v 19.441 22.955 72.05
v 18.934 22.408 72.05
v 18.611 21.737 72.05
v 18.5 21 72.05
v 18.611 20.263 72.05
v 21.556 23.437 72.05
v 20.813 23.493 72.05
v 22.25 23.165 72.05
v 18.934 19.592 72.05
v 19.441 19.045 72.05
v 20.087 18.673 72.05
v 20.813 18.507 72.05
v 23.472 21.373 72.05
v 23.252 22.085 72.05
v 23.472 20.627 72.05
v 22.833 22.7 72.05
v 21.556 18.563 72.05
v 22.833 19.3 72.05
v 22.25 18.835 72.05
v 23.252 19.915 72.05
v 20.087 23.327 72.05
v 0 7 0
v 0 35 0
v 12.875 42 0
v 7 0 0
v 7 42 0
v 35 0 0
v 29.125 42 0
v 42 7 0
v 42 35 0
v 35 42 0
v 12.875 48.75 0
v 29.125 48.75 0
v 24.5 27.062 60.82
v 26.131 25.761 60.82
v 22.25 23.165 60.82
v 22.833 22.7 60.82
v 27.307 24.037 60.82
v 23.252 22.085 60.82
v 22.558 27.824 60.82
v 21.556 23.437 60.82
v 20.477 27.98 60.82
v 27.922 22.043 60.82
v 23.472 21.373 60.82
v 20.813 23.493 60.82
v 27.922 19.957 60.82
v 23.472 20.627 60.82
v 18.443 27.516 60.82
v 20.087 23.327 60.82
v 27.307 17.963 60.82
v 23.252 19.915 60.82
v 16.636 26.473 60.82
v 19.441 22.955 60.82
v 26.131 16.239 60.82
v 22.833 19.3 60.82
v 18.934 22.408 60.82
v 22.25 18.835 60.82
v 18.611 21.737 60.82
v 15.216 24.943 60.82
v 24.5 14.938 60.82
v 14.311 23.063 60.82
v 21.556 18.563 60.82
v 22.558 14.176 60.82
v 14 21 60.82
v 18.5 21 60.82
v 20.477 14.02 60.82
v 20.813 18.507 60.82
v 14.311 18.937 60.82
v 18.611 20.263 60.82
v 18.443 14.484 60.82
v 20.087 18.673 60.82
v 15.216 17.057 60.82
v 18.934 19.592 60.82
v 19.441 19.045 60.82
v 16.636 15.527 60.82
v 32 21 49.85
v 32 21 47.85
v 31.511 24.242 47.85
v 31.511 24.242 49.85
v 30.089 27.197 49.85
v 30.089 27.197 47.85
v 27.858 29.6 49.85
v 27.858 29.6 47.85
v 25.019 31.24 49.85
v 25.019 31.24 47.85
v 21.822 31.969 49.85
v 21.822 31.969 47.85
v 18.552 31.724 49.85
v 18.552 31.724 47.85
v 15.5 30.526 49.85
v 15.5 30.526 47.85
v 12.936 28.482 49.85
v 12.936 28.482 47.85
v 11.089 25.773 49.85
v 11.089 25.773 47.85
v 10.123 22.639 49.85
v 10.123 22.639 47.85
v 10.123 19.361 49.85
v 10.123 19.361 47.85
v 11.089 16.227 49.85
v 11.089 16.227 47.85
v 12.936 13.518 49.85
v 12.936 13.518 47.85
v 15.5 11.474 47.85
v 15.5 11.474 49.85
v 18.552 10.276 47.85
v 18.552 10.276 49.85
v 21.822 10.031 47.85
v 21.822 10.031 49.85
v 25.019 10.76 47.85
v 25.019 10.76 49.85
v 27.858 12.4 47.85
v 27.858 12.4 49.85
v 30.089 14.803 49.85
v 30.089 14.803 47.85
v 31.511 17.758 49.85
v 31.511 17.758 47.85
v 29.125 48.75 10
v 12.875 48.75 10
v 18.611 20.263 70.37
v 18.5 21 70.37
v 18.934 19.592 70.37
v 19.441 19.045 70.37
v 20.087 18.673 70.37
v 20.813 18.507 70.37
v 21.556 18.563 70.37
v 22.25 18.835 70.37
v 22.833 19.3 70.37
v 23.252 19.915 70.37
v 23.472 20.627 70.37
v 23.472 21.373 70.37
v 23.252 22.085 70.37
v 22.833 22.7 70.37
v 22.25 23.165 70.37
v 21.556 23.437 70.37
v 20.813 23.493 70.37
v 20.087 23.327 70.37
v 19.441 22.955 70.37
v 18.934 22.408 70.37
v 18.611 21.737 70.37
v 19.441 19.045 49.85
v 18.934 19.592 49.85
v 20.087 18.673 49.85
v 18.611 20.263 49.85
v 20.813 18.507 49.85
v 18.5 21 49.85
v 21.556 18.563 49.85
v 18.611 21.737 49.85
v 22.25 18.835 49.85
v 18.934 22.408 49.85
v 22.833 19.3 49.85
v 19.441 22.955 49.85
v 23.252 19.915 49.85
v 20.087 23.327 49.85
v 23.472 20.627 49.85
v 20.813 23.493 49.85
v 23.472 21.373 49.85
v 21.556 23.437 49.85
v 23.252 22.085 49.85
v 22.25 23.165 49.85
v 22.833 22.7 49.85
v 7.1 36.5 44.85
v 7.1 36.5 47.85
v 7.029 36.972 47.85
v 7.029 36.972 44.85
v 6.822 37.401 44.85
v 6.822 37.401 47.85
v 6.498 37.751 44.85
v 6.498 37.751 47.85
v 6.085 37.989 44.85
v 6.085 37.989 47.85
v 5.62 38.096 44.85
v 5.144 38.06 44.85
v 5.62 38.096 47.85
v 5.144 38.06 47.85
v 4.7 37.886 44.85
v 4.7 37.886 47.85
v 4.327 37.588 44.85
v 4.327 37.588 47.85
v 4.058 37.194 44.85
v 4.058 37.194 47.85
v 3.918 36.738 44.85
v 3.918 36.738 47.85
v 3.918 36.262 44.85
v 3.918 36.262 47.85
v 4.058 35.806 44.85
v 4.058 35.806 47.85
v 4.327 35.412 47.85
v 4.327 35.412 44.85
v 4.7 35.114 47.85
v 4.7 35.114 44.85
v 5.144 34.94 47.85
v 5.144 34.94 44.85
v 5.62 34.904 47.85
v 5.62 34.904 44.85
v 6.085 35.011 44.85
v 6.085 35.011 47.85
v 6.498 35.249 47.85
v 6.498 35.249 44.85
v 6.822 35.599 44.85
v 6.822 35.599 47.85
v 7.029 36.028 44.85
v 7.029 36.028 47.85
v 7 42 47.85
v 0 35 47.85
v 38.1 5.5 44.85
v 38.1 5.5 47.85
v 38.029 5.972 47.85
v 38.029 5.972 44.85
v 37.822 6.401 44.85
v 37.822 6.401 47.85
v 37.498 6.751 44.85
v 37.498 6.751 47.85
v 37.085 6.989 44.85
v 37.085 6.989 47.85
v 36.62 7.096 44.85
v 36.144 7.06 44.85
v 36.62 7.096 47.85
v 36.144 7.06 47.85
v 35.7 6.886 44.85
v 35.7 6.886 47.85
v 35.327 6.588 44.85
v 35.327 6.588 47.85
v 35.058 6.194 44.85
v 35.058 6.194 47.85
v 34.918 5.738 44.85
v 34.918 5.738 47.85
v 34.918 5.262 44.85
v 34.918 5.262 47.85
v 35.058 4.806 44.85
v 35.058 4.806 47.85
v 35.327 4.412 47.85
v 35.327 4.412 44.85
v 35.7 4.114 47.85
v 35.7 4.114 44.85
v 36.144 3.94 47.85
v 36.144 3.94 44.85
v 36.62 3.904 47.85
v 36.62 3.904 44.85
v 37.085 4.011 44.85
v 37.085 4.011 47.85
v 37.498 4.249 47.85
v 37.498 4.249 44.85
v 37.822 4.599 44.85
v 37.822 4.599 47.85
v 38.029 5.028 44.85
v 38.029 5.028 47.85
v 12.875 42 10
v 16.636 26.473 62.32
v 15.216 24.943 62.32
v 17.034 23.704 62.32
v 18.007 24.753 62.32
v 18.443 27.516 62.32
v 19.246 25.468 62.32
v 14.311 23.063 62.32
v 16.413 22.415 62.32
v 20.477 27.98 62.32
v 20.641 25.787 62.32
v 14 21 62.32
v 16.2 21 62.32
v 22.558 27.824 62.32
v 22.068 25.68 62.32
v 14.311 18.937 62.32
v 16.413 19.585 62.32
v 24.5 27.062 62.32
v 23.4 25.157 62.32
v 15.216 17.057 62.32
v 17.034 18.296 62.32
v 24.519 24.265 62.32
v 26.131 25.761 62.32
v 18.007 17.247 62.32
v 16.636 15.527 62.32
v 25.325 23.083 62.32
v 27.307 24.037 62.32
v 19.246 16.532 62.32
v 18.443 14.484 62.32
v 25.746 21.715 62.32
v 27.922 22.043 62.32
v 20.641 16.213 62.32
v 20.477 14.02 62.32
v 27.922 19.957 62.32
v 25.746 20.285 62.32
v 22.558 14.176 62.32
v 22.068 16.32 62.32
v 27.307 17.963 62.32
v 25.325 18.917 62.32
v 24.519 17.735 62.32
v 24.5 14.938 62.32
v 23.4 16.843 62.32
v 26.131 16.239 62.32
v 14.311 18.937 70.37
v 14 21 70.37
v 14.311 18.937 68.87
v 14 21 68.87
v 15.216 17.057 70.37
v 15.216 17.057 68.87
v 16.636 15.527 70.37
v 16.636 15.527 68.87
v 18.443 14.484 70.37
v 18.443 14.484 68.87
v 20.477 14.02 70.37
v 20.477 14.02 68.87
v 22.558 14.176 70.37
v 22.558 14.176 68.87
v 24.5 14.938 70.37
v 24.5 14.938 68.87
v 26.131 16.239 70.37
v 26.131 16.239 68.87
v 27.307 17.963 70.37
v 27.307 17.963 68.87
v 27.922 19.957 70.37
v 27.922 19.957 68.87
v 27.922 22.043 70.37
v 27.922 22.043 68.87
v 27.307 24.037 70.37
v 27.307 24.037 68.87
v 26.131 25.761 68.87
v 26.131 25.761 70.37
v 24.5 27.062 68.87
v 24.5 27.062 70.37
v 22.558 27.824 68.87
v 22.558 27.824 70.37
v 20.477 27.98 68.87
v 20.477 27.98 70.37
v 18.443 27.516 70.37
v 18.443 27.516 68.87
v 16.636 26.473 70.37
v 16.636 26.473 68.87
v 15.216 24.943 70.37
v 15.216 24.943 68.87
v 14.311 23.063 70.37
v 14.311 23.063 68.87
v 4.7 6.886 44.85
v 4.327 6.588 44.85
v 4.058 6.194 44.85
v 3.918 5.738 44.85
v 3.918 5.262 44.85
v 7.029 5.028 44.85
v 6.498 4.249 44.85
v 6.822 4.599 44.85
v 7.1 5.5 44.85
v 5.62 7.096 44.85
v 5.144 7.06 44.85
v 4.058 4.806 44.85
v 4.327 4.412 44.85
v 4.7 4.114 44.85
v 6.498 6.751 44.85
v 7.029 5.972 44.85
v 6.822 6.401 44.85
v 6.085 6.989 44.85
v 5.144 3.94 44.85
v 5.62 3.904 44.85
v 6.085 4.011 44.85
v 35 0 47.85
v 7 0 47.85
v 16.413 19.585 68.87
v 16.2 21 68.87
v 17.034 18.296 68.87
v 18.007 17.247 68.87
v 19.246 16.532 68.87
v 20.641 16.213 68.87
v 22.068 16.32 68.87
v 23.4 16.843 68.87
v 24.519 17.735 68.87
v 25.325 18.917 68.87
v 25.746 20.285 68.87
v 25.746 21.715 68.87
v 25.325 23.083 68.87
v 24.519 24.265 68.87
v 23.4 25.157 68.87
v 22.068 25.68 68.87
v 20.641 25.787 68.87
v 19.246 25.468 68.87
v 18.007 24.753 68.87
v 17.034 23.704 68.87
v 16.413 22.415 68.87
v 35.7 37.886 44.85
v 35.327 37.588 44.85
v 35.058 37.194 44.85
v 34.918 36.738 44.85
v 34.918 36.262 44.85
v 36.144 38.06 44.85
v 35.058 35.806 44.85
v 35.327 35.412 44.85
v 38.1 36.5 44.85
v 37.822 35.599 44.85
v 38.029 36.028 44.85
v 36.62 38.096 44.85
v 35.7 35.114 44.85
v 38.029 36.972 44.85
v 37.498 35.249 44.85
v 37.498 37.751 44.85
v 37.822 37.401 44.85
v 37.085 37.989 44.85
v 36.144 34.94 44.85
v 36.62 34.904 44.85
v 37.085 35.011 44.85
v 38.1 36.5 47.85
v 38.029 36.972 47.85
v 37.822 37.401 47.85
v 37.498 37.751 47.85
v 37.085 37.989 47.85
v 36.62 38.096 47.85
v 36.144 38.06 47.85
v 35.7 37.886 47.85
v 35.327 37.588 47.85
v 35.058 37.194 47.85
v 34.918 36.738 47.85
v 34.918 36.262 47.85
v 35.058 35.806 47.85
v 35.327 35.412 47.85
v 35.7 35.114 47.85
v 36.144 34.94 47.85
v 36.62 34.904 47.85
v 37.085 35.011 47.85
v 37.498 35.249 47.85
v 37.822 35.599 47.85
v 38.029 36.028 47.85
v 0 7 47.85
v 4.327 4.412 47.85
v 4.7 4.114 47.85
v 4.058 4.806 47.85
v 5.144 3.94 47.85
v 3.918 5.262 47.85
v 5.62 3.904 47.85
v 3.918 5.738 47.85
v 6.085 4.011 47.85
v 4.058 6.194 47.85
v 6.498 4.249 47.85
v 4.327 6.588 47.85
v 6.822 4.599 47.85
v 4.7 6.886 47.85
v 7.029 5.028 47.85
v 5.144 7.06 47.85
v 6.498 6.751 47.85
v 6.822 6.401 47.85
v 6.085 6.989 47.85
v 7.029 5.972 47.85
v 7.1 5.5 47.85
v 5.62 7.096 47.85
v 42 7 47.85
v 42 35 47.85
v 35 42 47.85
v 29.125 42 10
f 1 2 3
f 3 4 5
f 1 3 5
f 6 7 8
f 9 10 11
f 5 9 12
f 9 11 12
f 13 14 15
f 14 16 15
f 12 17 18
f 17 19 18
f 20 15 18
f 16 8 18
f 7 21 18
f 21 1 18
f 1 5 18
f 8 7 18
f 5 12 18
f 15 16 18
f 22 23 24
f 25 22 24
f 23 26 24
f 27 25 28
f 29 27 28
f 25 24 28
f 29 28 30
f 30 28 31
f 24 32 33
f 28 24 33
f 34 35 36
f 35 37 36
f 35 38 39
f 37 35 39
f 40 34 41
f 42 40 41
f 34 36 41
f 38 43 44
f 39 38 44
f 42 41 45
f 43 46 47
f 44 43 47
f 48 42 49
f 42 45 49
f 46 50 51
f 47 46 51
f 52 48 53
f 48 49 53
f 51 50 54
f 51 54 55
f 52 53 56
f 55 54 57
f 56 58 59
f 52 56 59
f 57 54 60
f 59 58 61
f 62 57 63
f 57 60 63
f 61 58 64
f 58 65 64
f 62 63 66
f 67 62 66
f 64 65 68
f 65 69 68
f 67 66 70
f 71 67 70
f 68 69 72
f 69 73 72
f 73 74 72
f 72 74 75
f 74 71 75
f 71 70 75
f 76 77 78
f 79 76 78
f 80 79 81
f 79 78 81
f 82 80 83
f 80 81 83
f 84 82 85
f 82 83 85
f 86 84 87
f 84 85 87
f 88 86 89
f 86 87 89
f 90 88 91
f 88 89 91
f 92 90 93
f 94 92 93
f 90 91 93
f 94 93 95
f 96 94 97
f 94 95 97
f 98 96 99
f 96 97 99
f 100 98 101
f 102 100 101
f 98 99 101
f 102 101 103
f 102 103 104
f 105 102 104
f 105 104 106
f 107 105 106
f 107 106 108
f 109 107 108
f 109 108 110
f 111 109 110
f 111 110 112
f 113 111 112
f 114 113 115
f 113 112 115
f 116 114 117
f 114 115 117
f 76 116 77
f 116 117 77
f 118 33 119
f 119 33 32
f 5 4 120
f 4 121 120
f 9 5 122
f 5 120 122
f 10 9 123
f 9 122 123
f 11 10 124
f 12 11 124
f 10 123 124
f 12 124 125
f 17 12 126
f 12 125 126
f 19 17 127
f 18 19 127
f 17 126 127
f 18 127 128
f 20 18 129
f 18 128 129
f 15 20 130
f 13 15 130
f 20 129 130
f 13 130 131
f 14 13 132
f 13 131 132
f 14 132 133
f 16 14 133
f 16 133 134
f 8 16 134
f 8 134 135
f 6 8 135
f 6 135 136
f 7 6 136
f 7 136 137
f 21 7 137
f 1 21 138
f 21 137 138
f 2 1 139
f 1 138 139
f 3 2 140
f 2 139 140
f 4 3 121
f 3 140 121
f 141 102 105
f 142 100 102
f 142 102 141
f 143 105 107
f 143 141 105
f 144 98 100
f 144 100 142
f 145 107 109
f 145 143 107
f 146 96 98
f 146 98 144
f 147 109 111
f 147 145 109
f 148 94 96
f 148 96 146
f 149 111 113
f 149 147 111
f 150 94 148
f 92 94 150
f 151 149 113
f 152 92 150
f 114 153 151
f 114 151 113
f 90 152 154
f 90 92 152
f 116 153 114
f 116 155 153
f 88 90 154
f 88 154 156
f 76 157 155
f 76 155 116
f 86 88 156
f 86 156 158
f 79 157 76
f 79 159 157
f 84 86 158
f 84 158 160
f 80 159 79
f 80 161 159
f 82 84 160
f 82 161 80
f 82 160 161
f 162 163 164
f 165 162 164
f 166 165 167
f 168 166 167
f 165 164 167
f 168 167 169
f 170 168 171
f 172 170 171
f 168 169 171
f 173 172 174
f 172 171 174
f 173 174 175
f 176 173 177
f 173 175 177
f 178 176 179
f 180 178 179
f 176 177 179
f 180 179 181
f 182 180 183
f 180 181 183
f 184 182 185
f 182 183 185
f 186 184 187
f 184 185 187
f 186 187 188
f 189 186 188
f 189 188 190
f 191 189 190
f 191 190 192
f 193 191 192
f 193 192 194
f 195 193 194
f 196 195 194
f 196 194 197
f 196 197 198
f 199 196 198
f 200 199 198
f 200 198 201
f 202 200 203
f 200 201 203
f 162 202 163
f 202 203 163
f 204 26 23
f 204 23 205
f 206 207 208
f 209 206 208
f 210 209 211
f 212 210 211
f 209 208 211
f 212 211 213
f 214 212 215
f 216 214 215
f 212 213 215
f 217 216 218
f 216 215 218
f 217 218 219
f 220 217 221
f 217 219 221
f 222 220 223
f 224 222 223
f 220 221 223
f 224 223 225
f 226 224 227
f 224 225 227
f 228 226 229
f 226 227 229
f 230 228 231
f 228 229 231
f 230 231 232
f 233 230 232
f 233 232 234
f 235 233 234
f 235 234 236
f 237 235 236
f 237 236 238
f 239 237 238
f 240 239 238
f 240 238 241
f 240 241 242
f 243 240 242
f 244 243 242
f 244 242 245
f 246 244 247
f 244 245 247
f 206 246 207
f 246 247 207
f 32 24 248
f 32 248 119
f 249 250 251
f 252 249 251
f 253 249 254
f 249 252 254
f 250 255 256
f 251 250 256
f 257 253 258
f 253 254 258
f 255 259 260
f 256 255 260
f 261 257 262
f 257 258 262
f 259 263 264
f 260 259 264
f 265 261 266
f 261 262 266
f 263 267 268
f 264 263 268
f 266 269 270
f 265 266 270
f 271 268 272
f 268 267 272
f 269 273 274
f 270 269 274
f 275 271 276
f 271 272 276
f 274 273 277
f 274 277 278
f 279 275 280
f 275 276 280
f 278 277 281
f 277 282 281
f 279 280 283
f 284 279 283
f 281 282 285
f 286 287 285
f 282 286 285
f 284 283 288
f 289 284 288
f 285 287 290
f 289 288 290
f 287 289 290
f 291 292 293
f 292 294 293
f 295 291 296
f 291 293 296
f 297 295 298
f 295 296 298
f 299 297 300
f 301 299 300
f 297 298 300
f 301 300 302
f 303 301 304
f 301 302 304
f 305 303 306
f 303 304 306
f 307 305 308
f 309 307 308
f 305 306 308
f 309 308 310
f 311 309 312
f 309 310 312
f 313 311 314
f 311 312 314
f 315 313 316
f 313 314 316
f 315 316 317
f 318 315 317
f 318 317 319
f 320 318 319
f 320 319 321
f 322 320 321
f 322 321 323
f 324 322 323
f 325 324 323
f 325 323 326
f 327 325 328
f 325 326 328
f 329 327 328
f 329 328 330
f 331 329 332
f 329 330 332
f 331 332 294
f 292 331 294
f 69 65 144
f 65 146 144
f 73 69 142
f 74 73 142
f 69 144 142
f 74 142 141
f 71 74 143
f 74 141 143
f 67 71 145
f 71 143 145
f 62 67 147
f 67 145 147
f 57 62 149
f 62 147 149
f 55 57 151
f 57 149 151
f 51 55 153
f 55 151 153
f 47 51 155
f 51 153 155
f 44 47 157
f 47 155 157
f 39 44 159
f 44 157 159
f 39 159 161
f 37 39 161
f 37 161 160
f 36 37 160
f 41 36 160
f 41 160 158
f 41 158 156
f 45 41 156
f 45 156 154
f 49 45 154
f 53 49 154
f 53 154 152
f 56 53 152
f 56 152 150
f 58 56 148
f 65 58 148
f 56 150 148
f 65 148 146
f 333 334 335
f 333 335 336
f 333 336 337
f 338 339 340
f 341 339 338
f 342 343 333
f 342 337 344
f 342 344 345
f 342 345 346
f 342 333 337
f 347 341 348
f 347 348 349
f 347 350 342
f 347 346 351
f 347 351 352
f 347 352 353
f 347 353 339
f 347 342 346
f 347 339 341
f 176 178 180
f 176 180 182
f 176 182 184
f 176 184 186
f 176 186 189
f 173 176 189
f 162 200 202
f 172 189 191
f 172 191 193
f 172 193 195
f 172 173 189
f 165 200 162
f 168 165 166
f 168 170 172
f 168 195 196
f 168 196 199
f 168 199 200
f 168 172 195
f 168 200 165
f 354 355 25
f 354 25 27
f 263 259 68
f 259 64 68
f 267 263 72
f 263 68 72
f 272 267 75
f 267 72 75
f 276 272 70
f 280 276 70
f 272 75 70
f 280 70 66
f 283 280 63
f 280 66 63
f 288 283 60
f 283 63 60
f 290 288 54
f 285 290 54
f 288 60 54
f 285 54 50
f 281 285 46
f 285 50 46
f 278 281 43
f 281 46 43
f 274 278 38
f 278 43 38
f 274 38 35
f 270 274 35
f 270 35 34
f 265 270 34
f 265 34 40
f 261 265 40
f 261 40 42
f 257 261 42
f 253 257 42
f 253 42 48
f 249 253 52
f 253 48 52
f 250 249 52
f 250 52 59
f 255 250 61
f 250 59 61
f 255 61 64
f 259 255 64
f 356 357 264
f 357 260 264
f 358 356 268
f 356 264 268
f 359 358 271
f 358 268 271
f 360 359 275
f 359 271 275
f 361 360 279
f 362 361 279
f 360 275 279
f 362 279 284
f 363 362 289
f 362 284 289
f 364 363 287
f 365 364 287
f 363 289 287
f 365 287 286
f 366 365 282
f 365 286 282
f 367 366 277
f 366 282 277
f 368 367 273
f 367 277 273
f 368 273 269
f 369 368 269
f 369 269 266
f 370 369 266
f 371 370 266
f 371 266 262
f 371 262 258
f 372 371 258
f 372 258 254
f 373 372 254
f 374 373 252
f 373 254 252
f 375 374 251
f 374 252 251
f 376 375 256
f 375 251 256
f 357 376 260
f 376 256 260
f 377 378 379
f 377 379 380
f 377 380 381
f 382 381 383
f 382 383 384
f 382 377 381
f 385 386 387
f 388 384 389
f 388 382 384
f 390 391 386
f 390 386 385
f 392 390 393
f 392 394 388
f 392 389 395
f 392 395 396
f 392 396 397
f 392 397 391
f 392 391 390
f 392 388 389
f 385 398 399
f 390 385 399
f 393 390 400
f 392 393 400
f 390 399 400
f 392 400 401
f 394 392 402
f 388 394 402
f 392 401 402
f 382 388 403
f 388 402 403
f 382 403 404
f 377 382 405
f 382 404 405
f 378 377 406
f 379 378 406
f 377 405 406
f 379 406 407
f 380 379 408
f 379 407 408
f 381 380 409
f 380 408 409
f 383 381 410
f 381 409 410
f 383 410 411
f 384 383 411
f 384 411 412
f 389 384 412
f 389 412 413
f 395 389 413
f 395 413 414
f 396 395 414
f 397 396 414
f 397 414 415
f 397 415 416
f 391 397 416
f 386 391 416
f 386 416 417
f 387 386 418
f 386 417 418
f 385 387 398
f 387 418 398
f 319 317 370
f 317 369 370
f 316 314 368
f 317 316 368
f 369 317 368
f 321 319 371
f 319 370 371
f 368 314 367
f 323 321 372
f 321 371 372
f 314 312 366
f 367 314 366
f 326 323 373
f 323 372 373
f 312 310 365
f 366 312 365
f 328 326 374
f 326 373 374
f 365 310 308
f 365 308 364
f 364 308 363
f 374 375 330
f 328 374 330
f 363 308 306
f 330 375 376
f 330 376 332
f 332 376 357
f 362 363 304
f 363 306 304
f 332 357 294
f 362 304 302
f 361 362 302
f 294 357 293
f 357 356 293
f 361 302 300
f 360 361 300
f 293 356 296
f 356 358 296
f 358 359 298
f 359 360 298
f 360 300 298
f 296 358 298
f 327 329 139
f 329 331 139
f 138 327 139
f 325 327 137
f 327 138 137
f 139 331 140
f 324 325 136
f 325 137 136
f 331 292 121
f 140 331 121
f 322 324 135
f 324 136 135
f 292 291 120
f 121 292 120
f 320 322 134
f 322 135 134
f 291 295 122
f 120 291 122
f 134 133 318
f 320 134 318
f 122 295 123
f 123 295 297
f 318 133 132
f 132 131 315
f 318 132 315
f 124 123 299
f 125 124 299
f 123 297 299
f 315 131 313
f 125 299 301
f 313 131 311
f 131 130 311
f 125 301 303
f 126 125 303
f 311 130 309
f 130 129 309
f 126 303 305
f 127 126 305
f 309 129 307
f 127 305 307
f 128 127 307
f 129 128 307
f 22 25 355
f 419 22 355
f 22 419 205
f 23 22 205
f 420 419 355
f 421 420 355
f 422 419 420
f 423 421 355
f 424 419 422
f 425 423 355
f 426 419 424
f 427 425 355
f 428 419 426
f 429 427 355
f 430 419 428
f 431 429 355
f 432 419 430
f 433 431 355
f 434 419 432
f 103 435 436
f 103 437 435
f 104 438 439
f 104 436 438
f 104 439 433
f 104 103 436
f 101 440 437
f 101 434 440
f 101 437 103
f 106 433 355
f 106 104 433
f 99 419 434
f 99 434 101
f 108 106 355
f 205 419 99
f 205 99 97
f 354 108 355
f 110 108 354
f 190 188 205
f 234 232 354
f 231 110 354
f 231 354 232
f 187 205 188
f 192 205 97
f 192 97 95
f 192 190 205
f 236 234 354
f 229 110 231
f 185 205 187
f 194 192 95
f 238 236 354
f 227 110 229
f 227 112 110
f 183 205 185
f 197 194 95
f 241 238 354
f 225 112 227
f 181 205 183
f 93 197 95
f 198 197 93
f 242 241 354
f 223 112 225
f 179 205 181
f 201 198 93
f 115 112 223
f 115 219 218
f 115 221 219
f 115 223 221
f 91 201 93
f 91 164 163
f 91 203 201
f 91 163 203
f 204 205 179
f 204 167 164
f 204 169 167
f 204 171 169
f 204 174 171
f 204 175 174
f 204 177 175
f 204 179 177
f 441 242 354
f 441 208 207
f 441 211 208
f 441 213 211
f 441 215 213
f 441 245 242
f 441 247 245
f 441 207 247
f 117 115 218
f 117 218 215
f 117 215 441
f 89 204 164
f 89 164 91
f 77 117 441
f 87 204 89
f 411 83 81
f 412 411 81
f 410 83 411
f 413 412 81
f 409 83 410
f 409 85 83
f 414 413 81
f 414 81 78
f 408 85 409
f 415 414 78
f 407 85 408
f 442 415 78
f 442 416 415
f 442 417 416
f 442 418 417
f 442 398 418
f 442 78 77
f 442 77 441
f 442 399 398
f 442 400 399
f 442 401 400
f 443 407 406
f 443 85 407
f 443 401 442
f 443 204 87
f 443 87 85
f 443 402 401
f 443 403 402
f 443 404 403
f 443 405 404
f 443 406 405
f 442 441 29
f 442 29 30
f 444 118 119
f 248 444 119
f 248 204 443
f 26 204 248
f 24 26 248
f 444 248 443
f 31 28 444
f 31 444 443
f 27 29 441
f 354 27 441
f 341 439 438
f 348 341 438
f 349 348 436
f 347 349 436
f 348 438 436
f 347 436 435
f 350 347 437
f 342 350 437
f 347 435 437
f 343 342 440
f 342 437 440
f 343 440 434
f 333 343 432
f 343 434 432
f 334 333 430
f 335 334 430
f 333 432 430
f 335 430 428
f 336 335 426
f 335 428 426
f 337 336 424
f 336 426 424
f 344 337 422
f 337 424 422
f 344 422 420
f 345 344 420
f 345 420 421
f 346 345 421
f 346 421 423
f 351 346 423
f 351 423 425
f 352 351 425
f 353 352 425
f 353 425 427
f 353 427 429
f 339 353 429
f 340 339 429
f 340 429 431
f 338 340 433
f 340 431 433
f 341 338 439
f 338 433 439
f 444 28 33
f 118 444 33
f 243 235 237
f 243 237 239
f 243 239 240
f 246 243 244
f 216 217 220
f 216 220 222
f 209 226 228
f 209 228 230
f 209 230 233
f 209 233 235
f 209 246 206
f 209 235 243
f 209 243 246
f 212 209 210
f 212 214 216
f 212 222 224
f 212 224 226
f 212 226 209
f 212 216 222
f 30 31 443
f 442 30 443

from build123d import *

# Parameters (mm, degrees)
SKETCH1_W           = 42
SKETCH1_H           = 42
BOSS_EXTRUDE1_DEPTH = 47.85
CHAMFER1_SIZE       = 7
SKETCH2_R           = 11
BOSS_EXTRUDE2_DEPTH = 2
SKETCH3_W           = 16.25
SKETCH3_H           = 6.75
BOSS_EXTRUDE3_DEPTH = 10
SKETCH4_R           = 1.6
CUT_EXTRUDE1_DEPTH  = 3


with BuildPart() as part:
    # Sketch1 → Boss-Extrude1 (new body)
    with BuildSketch(Plane.XY):
        with Locations((21, 21)):
            Rectangle(SKETCH1_W, SKETCH1_H)
    extrude(amount=BOSS_EXTRUDE1_DEPTH)

    # Chamfer1
    chamfer1_edges = [part.edges().sort_by_distance(p)[0] for p in [
        (0, 42, 23.925),
        (42, 42, 23.925),
        (42, 0, 23.925),
        (0, 0, 23.925),
    ]]
    chamfer(chamfer1_edges, length=CHAMFER1_SIZE)

    # Sketch2 → Boss-Extrude2 (add)
    with BuildSketch(Plane.XY.offset(47.85)):
        with Locations((21, 21)):
            Circle(SKETCH2_R)
    extrude(amount=BOSS_EXTRUDE2_DEPTH)

    # Sketch3 → Boss-Extrude3 (add)
    with BuildSketch(Plane(origin=(0, 0, 0), x_dir=(-1, 0, 0), z_dir=(0, 0, -1))):
        with Locations((-21, 45.375)):
            Rectangle(SKETCH3_W, SKETCH3_H)
    extrude(amount=-BOSS_EXTRUDE3_DEPTH)

    # Sketch4 → Cut-Extrude1 (cut)
    with BuildSketch(Plane.XY.offset(47.85)):
        with Locations((5.5, 36.5)):
            Circle(SKETCH4_R)
        with Locations((36.5, 36.5)):
            Circle(SKETCH4_R)
        with Locations((36.5, 5.5)):
            Circle(SKETCH4_R)
        with Locations((5.5, 5.5)):
            Circle(SKETCH4_R)
    extrude(amount=-CUT_EXTRUDE1_DEPTH, mode=Mode.SUBTRACT)

    # Sketch5 → Revolve1 (revolve)
    with BuildSketch(Plane(origin=(0, 21, 0), x_dir=(-1, 0, 0), z_dir=(0, -1, 0))):
        Polygon((-18.5, -49.85), (-21, -49.85), (-21, -72.05), (-18.5, -72.05), (-18.5, -70.37), (-14, -70.37), (-14, -68.87), (-16.2, -68.87), (-16.2, -62.32), (-14, -62.32), (-14, -60.82), (-18.5, -60.82), align=None)
    revolve(axis=Axis((21, 21, 49.85), (0, 0, 1)))


solid = part.part
